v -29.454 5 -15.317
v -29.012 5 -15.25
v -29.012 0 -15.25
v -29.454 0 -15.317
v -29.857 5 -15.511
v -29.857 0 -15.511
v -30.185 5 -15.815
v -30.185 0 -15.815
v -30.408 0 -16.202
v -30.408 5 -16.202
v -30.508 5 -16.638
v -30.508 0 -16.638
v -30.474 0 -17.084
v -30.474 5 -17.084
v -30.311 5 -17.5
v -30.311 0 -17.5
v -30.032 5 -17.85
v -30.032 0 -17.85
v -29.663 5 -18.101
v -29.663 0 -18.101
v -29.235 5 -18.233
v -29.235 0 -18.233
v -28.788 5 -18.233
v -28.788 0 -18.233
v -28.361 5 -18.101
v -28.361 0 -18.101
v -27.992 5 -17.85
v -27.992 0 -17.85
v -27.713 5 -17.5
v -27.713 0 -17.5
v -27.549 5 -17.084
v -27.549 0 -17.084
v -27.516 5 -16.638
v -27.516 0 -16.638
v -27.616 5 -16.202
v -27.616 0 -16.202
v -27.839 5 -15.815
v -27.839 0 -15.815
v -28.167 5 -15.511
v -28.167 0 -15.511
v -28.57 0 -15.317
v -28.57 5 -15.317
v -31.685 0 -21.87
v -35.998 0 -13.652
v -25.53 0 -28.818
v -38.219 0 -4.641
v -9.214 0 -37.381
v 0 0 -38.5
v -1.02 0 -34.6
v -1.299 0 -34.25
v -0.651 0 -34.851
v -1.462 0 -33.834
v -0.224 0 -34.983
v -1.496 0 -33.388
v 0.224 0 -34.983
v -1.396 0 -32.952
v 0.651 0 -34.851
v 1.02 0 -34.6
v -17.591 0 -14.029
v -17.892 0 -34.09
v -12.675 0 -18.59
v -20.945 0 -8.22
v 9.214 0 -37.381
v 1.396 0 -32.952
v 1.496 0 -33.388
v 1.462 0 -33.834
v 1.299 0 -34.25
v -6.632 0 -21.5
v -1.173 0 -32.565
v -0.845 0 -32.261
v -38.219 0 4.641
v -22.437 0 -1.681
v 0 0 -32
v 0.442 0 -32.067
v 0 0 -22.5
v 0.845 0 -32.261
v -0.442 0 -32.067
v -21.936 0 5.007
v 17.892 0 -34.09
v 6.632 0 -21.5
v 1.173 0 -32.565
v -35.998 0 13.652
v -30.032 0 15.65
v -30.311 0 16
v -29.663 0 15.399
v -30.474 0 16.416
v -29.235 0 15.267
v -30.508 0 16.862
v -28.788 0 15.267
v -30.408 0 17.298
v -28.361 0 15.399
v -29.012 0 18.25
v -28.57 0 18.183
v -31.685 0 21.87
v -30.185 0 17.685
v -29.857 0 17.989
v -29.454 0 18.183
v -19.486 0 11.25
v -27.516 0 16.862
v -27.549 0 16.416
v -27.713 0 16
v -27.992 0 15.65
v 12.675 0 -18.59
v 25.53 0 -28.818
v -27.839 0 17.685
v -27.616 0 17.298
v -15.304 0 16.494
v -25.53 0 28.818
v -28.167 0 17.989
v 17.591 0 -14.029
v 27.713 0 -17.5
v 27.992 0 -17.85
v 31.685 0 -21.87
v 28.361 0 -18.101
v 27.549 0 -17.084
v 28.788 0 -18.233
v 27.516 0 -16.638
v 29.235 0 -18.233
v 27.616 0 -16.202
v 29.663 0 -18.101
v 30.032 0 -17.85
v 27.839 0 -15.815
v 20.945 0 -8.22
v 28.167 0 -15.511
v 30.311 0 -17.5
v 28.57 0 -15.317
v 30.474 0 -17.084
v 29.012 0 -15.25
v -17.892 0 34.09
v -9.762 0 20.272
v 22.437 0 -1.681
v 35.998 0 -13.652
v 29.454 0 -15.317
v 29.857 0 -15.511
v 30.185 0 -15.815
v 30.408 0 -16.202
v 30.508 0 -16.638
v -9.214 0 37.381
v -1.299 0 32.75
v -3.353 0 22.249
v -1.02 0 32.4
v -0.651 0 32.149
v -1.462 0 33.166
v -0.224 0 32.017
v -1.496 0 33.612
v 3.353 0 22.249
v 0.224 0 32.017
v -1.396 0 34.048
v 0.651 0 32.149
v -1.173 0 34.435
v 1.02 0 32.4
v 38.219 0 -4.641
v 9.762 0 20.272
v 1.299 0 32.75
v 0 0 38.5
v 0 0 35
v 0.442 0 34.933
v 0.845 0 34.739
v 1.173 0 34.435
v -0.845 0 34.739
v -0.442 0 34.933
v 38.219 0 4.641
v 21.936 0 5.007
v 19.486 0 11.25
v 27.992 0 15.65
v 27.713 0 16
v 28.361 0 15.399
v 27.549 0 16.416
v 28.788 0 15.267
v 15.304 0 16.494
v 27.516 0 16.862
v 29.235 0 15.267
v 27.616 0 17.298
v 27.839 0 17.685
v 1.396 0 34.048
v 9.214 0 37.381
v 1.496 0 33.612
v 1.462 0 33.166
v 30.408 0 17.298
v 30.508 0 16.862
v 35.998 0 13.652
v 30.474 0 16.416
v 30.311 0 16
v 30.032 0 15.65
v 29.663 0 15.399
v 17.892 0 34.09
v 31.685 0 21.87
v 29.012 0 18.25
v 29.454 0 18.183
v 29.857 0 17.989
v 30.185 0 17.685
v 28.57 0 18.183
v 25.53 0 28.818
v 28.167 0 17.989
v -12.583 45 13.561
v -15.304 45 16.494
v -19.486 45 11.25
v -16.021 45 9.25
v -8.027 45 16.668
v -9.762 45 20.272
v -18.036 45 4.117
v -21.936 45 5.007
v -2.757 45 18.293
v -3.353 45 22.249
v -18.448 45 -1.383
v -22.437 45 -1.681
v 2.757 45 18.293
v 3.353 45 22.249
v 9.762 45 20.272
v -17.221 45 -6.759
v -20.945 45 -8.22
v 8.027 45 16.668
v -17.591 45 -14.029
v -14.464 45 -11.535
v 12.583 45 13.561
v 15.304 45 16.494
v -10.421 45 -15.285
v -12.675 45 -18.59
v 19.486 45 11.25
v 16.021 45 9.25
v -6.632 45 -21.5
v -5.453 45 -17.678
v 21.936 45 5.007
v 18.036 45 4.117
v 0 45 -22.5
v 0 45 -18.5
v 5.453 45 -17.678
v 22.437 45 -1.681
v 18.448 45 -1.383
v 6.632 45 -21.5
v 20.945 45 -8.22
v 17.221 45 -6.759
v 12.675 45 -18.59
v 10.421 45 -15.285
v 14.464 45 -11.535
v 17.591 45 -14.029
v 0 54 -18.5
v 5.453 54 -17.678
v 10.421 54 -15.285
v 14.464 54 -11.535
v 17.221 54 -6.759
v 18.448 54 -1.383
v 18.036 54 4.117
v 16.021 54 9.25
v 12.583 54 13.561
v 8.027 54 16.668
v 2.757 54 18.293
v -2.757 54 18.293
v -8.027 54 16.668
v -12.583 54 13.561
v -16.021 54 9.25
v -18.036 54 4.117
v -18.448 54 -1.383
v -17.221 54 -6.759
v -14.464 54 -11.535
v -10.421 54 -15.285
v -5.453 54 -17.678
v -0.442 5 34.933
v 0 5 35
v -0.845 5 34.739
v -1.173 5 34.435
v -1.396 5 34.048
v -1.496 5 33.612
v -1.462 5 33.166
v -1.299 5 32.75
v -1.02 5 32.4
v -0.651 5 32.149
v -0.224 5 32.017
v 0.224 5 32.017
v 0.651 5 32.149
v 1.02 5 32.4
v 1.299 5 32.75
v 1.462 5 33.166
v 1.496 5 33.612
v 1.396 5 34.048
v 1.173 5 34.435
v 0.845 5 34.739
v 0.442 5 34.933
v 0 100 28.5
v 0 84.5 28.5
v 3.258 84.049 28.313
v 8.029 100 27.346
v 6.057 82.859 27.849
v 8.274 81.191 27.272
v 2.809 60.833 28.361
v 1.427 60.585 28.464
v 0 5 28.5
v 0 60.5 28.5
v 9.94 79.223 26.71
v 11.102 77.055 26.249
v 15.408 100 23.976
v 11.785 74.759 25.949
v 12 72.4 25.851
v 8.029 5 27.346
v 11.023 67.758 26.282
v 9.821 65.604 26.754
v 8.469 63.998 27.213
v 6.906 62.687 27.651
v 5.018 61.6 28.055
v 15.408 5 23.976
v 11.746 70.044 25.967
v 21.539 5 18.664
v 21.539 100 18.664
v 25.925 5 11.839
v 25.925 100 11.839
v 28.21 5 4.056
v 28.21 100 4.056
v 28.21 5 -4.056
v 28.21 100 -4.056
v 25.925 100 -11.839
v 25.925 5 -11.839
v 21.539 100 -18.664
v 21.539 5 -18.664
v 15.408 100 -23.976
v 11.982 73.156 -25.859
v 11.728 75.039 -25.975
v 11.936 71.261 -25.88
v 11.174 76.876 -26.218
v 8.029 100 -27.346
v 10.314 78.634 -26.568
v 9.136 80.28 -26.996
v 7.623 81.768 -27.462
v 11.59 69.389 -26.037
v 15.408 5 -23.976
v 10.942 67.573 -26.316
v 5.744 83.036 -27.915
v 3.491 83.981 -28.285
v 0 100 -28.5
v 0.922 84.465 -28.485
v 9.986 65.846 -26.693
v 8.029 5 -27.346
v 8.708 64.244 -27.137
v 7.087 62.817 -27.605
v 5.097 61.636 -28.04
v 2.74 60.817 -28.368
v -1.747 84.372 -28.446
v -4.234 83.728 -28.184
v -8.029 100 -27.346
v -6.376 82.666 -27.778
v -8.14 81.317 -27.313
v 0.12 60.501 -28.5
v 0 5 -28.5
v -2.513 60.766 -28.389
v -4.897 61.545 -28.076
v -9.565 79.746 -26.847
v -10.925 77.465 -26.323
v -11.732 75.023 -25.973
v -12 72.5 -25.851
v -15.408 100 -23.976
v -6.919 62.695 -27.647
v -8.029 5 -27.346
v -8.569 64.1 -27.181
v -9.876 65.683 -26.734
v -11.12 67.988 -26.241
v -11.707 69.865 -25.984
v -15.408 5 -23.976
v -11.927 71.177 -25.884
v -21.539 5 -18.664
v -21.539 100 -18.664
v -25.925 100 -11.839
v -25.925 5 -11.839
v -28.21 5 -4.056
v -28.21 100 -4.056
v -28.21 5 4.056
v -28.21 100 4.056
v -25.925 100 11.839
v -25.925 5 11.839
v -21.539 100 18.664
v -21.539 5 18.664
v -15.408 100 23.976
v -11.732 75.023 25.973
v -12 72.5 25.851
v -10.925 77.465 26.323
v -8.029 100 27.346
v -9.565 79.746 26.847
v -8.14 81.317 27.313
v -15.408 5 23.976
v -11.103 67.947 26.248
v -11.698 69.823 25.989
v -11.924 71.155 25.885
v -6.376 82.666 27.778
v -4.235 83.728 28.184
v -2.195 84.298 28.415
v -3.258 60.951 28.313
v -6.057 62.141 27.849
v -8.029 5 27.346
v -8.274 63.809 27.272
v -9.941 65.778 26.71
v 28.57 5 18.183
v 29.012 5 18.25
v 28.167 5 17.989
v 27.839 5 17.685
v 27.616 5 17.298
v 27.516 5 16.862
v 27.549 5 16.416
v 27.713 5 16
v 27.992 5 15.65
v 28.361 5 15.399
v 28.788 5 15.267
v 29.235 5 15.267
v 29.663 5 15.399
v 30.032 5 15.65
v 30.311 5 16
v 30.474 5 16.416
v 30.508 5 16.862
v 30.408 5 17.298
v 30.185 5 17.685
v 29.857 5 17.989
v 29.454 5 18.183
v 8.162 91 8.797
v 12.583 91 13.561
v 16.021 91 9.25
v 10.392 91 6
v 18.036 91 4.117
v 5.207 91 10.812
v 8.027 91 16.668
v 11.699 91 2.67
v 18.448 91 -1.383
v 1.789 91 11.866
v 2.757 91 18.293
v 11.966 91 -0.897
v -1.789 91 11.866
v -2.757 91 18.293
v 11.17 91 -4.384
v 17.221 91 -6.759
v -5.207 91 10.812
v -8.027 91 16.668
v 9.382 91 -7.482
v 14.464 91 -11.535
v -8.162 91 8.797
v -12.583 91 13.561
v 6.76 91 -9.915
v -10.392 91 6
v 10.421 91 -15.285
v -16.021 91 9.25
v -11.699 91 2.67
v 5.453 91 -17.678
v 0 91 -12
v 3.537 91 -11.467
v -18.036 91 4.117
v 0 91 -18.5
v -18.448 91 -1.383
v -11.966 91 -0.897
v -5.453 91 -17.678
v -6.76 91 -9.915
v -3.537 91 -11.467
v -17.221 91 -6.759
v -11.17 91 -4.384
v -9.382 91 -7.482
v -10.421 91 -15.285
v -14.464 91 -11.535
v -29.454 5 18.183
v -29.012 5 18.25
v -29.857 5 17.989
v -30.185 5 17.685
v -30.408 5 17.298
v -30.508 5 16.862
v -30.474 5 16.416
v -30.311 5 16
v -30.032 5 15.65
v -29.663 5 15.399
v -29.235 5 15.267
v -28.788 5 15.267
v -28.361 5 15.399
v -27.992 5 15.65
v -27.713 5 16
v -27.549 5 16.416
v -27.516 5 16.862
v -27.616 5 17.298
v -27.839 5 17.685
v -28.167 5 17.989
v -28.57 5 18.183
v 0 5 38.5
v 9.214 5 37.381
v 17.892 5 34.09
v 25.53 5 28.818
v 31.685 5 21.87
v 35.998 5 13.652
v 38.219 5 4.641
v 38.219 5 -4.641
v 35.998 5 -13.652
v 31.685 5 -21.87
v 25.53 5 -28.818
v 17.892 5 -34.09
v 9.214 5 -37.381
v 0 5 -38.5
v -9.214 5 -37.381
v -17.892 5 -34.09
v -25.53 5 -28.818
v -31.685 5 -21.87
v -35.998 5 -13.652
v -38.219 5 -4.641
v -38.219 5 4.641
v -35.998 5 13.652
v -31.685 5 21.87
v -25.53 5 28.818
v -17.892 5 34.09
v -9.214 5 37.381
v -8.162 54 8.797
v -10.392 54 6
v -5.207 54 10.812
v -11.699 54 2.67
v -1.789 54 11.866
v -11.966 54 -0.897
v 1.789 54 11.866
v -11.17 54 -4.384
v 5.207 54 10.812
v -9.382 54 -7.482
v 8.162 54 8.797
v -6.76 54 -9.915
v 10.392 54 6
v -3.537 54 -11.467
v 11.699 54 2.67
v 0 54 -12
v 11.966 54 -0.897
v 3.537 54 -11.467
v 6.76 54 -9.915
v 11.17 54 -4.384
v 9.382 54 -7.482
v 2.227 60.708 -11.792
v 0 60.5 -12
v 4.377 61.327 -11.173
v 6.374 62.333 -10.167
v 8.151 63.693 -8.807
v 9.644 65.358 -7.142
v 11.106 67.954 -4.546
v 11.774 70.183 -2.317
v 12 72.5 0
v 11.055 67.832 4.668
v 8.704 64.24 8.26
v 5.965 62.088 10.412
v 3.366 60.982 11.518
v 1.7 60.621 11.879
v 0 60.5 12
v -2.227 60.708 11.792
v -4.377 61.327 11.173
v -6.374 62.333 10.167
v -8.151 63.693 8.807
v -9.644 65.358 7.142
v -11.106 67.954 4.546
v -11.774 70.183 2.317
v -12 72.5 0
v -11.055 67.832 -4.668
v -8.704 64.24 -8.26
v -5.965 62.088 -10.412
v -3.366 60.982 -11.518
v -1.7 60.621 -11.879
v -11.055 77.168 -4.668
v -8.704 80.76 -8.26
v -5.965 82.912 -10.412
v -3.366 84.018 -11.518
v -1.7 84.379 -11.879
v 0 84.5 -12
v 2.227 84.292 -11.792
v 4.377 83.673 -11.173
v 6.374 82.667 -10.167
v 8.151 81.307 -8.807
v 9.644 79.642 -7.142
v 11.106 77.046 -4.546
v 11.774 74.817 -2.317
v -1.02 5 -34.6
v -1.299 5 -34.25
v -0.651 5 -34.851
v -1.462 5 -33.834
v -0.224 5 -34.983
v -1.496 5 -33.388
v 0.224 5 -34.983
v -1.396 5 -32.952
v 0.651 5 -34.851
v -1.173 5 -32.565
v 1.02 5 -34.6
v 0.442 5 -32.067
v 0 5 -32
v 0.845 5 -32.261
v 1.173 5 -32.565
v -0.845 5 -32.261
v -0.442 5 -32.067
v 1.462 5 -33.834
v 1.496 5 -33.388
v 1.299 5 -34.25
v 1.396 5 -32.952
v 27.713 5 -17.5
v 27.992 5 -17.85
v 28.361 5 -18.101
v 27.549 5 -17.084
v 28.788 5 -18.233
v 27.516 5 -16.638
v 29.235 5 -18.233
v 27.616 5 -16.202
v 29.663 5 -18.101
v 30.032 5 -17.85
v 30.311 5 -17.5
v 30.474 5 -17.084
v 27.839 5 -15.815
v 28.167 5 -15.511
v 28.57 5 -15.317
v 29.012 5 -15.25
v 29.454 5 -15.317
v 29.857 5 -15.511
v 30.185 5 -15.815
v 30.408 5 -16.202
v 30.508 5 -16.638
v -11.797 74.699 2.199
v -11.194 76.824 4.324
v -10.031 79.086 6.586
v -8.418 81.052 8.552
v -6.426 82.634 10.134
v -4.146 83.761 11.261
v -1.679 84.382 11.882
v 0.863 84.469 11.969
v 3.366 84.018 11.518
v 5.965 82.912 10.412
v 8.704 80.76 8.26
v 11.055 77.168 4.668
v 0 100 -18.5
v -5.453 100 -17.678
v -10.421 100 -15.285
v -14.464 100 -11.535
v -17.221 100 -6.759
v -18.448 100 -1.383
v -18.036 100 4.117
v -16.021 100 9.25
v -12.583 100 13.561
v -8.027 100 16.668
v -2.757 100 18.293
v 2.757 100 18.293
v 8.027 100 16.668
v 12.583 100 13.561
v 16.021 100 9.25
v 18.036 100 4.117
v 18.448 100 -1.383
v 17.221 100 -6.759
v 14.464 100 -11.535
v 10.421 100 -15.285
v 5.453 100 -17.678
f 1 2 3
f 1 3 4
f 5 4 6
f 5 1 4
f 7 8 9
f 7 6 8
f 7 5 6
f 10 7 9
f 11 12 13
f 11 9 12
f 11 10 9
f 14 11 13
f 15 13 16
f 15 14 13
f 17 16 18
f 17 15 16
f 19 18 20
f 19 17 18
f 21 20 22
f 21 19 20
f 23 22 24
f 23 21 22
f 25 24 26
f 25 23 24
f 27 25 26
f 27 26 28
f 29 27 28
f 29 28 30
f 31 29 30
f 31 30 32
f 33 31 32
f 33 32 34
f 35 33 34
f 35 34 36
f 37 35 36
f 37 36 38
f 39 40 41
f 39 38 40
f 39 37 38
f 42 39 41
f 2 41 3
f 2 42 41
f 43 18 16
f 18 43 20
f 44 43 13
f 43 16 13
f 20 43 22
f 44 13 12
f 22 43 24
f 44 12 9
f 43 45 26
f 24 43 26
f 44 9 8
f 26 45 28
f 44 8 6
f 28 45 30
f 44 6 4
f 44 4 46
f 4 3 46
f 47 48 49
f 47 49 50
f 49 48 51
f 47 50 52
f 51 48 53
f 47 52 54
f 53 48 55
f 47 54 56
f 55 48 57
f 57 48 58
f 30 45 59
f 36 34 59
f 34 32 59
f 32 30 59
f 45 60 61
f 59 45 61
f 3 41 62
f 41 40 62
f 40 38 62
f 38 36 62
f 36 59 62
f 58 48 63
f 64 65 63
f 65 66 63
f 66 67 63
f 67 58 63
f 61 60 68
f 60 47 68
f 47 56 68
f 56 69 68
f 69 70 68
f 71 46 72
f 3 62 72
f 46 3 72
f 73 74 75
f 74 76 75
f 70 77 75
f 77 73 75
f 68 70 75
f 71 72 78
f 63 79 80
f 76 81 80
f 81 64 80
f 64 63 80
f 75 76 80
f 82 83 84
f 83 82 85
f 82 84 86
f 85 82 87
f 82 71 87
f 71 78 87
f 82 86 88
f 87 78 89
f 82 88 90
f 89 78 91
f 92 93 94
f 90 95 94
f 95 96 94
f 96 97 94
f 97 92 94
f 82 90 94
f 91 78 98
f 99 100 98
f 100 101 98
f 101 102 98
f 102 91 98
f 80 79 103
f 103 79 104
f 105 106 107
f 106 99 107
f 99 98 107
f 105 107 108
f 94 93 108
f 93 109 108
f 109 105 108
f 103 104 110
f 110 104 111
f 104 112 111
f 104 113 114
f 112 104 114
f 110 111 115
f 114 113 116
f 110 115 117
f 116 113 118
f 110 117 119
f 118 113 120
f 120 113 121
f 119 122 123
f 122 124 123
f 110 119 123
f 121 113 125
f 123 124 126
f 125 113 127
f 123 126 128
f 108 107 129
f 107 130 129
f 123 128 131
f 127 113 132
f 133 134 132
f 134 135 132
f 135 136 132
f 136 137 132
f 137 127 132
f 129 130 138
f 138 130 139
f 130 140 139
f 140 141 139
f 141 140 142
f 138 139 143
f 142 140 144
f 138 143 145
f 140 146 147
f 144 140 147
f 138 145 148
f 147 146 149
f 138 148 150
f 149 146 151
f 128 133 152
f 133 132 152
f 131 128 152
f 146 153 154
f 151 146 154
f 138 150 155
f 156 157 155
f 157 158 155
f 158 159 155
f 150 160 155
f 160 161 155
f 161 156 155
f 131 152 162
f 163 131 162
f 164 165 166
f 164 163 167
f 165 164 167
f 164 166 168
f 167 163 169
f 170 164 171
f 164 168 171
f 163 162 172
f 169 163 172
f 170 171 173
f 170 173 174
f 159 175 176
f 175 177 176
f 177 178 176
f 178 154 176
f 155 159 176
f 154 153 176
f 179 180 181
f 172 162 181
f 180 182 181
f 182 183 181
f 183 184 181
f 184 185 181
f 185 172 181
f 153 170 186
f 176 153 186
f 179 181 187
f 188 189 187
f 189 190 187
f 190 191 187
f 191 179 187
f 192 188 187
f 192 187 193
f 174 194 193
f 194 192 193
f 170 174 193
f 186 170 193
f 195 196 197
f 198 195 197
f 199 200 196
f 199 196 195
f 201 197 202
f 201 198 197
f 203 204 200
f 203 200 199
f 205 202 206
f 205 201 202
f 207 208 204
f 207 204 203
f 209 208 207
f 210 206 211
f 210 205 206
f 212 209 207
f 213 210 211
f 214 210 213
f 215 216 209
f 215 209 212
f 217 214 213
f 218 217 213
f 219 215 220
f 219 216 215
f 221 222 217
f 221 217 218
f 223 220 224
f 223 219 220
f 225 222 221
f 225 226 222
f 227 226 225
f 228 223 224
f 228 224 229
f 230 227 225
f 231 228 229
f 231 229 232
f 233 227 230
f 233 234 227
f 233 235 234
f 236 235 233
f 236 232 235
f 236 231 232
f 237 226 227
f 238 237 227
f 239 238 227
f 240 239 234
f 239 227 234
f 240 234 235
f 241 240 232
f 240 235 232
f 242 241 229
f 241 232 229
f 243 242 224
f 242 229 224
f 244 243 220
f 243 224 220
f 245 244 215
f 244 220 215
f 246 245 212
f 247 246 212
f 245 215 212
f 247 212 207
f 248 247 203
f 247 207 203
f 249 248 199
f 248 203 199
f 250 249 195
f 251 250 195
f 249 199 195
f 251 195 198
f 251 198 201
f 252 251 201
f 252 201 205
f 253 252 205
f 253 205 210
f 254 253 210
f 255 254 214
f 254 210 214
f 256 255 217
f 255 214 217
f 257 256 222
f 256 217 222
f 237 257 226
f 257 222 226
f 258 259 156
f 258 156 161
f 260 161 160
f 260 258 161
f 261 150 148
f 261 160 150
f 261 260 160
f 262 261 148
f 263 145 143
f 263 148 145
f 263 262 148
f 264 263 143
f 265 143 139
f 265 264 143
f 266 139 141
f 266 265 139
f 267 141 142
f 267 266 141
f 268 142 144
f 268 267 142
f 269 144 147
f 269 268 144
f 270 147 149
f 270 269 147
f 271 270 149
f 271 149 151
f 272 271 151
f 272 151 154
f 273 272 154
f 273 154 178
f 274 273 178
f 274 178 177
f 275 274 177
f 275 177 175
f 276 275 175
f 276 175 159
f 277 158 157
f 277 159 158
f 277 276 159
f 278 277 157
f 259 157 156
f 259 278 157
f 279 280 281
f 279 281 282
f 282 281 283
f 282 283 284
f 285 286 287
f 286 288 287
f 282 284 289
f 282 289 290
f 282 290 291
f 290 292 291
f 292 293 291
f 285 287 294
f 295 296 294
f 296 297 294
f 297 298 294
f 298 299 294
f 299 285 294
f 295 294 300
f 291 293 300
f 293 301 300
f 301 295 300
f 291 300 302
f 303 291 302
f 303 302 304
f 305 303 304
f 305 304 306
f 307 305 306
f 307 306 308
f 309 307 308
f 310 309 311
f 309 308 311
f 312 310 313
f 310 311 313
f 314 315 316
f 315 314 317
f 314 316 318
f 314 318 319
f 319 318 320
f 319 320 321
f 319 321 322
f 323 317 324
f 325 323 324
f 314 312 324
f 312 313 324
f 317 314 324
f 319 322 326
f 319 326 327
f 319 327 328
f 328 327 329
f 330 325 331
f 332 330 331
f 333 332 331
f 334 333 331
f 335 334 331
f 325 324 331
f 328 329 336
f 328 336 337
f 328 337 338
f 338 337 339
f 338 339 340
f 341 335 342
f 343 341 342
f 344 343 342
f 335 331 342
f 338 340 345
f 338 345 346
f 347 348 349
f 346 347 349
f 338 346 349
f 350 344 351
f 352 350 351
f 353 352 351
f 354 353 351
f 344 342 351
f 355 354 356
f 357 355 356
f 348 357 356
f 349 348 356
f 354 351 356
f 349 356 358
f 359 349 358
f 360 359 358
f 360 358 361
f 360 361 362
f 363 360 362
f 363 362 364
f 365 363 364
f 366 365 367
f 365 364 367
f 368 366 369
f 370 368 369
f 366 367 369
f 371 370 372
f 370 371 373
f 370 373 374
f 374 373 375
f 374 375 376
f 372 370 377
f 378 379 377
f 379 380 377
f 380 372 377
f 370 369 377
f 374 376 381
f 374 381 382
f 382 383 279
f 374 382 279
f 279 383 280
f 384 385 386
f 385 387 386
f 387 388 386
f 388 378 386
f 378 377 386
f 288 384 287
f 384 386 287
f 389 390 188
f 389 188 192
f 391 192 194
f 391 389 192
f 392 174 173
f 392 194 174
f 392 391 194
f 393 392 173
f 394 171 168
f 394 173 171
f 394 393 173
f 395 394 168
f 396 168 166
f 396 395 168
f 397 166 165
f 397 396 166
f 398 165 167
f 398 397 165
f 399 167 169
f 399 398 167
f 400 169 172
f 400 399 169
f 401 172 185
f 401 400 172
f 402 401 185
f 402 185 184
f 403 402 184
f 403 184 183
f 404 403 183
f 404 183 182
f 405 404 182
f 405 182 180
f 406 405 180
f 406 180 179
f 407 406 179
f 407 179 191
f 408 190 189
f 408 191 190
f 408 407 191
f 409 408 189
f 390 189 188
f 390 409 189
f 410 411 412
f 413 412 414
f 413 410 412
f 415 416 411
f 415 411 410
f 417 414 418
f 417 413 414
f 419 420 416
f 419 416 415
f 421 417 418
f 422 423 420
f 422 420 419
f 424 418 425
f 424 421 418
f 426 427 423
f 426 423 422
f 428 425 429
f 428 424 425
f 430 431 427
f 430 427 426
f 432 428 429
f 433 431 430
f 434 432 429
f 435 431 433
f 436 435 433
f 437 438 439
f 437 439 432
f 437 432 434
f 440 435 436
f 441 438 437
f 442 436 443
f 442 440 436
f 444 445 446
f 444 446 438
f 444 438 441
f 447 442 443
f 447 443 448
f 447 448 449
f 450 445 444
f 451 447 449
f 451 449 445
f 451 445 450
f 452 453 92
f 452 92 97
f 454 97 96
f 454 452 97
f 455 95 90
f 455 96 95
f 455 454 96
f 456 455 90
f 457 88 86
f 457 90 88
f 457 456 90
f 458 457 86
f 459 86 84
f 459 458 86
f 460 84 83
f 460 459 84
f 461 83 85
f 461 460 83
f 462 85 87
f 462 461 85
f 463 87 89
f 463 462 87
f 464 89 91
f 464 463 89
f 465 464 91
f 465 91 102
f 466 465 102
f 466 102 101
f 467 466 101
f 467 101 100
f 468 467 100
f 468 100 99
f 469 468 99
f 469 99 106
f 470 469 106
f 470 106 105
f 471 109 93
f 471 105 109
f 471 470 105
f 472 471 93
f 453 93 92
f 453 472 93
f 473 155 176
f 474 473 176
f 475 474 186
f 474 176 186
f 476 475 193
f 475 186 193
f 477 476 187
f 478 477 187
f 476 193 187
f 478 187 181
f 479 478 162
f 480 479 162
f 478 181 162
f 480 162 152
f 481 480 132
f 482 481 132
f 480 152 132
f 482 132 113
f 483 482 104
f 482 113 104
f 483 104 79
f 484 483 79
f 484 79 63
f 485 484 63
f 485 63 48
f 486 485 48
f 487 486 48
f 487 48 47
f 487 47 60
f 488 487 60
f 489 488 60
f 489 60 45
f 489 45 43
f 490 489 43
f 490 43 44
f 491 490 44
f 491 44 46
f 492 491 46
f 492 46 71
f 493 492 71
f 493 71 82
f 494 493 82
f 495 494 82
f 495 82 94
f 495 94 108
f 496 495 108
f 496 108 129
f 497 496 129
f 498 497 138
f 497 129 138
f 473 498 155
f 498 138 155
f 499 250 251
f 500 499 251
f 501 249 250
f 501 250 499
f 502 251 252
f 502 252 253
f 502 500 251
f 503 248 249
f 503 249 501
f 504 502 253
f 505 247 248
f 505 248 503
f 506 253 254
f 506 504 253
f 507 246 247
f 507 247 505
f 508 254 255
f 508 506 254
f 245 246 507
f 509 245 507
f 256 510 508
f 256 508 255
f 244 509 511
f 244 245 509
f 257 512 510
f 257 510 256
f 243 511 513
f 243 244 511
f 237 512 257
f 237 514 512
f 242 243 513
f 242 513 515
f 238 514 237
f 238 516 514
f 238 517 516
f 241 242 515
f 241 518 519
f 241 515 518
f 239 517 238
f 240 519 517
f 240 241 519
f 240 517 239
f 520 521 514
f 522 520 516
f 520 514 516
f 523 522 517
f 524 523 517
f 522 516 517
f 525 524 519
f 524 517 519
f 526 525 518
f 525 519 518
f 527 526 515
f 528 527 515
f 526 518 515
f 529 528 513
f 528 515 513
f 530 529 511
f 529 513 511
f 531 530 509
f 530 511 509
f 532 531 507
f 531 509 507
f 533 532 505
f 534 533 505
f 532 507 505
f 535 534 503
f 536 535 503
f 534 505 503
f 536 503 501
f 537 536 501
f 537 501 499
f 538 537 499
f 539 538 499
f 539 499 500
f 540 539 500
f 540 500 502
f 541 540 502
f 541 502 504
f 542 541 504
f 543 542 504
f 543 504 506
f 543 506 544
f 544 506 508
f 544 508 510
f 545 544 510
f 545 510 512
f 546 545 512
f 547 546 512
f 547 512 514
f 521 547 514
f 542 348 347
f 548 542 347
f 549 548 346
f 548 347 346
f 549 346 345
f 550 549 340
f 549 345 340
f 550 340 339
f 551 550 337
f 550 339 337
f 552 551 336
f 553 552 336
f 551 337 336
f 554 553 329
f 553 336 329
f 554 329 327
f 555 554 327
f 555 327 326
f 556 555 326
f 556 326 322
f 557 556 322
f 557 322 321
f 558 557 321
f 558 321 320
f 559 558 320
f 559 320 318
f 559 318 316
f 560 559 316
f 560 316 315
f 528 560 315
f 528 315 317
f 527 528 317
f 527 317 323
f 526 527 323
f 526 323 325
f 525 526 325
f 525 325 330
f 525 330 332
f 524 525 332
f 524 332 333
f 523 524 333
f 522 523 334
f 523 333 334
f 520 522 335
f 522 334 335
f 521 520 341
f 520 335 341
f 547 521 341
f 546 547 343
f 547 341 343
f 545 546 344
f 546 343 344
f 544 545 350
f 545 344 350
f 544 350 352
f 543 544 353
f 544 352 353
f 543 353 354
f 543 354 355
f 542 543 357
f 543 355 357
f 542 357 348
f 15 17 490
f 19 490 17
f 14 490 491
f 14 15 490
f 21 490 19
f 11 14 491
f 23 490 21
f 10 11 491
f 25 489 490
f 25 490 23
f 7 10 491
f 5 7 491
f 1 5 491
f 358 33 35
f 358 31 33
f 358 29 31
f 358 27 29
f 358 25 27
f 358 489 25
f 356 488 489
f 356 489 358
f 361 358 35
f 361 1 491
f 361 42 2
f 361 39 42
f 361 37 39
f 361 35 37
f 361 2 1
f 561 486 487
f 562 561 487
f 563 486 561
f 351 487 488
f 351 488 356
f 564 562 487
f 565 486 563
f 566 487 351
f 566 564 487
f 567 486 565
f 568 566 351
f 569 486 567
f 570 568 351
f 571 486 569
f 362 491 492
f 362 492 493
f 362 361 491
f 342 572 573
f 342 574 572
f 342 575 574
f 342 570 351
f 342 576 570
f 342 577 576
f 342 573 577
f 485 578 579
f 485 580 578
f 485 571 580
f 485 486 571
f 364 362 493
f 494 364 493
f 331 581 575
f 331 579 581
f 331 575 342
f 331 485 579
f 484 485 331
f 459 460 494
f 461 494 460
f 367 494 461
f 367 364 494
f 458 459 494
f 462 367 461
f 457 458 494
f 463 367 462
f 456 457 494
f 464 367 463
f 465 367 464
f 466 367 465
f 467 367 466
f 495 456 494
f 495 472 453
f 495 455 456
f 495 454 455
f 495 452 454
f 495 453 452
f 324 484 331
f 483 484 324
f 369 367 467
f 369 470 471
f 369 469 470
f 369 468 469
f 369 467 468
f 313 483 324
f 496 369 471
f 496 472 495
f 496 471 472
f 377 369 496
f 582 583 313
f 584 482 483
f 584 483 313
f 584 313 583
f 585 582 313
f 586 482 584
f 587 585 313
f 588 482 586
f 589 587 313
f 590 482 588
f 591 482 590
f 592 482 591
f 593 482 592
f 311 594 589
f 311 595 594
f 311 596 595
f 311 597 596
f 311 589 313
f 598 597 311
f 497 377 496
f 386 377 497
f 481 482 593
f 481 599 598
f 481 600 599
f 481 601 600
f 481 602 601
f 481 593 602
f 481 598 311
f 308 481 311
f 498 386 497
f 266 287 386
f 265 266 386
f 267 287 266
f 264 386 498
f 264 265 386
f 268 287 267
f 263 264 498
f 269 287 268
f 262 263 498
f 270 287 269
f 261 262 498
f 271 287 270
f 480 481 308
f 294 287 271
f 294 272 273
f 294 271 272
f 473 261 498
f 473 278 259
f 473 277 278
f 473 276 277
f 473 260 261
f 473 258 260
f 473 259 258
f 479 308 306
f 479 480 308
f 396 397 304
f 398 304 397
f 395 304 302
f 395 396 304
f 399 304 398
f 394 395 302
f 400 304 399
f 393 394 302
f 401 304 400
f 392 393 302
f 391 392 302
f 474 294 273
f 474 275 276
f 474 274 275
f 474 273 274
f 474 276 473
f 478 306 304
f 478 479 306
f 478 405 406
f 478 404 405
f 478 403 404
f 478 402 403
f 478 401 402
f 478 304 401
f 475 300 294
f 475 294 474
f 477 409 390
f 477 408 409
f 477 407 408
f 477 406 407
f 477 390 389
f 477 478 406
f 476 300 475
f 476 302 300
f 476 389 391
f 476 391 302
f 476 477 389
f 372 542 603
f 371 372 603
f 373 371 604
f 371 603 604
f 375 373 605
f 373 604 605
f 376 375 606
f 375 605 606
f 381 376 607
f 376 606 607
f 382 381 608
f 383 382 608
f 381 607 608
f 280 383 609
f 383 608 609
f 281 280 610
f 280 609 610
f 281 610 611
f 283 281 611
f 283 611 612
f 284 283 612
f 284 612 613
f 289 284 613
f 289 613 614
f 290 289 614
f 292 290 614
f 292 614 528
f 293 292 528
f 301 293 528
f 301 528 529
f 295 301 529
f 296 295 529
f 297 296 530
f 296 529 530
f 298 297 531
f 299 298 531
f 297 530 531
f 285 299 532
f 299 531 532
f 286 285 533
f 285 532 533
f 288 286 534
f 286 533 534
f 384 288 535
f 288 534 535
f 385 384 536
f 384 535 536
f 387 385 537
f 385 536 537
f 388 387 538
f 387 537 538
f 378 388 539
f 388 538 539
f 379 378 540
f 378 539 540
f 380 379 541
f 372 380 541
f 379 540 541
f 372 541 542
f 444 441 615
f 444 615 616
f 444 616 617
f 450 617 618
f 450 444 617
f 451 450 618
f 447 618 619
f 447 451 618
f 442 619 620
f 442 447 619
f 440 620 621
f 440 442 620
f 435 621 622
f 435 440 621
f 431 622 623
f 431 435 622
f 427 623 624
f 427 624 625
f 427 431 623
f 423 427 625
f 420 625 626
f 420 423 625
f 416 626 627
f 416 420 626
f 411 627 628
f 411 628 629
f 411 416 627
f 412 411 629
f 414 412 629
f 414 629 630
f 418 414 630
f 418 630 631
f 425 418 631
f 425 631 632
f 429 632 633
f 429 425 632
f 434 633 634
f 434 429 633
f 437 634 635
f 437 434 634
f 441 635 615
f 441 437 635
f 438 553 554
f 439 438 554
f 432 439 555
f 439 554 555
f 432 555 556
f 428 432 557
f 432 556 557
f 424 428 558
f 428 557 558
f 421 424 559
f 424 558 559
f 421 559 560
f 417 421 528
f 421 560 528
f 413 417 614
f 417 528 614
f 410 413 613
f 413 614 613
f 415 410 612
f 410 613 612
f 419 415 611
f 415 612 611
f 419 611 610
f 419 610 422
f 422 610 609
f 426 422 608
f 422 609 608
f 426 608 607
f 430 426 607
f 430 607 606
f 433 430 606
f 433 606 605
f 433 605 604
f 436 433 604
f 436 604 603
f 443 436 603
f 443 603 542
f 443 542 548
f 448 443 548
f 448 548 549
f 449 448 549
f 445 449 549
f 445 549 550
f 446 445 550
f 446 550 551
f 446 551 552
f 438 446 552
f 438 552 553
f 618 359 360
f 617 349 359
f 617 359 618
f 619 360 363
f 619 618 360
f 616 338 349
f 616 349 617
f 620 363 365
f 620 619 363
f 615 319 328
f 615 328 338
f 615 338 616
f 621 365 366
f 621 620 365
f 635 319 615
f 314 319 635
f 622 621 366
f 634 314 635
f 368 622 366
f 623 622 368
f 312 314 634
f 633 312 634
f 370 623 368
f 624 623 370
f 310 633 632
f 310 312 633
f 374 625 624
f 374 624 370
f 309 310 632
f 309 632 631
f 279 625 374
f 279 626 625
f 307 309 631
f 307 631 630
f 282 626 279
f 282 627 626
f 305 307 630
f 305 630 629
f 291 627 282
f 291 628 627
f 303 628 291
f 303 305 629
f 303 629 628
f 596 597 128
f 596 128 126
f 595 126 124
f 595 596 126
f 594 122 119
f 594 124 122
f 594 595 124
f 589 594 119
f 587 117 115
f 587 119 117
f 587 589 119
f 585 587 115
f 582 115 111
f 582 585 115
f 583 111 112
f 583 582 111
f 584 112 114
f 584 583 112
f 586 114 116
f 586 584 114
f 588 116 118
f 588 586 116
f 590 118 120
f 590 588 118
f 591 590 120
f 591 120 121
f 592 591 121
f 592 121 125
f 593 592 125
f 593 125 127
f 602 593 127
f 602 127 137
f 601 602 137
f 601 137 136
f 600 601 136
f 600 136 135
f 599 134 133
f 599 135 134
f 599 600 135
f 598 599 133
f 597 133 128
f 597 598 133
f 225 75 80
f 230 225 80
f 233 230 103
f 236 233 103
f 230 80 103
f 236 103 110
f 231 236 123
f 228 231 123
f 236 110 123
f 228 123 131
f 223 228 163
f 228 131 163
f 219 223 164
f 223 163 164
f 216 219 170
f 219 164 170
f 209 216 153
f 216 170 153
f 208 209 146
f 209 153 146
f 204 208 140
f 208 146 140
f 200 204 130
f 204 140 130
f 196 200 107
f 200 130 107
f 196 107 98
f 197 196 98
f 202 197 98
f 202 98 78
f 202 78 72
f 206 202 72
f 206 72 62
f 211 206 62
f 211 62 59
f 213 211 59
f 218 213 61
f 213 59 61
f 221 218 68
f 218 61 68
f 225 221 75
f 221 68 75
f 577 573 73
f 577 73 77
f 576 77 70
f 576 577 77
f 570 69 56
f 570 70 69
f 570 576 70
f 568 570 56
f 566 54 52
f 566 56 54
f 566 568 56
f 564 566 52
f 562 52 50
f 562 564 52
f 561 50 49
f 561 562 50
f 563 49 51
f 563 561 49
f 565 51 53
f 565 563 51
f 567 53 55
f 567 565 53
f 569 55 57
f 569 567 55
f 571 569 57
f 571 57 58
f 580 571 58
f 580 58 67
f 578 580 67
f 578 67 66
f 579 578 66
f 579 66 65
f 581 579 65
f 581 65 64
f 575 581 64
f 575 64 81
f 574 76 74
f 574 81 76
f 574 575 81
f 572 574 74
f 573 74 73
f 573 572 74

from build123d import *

# Parameters (mm, degrees)
ESQUISSE1_R             = 38.5
BOSS_EXTRU_1_DEPTH      = 100
ENL_V_START             = -95
ESQUISSE2_R             = 38.5
ESQUISSE2_R_2           = 28.5
ENL_V_MAT_EXTRU_1_DEPTH = 95
ESQUISSE4_R             = 22.5
ENL_V_MAT_EXTRU_2_DEPTH = 45
ESQUISSE5_R             = 18.5
ENL_V_MAT_EXTRU_3_DEPTH = 9
ESQUISSE6_R             = 12
ENL_V_MAT_EXTRU_4_DEPTH = 77.684418235
D_GAGEMENT_M222_D       = 24
ESQUISSE14_R            = 1.5
ENL_V_MAT_EXTRU_8_DEPTH = 77.684418235
ENL_V_START_2           = -9
ESQUISSE16_R            = 18.5
ENL_V_MAT_EXTRU_9_DEPTH = 9


with BuildPart() as part:
    # Esquisse1 → Boss.-Extru.1 (new body)
    with BuildSketch(Plane(origin=(0, 0, 0), x_dir=(1, 0, 0), z_dir=(0, 1, 0))):
        with Locations(Location((0, 0, 0), (0, 0, 270))):
            Circle(ESQUISSE1_R)
    extrude(amount=BOSS_EXTRU_1_DEPTH)

    # Esquisse2 → Enlèv. mat.-Extru.1 (cut)
    with BuildSketch(Plane(origin=(0, 100, 0), x_dir=(1, 0, 0), z_dir=(0, 1, 0)).offset(ENL_V_START)):
        with Locations(Location((0, 0, 0), (0, 0, 270))):
            Circle(ESQUISSE2_R)
        with Locations(Location((0, 0, 0), (0, 0, 270))):
            Circle(ESQUISSE2_R_2, mode=Mode.SUBTRACT)
    extrude(amount=ENL_V_MAT_EXTRU_1_DEPTH, mode=Mode.SUBTRACT)

    # Esquisse4 → Enlèv. mat.-Extru.2 (cut)
    with BuildSketch(Plane(origin=(0, 0, 0), x_dir=(-1, 0, 0), z_dir=(0, -1, 0))):
        with Locations(Location((0, 0, 0), (0, 0, 90))):
            Circle(ESQUISSE4_R)
    extrude(amount=-ENL_V_MAT_EXTRU_2_DEPTH, mode=Mode.SUBTRACT)

    # Esquisse5 → Enlèv. mat.-Extru.3 (cut)
    with BuildSketch(Plane(origin=(0, 45, 0), x_dir=(-1, 0, 0), z_dir=(0, -1, 0))):
        with Locations(Location((0, 0, 0), (0, 0, 90))):
            Circle(ESQUISSE5_R)
    extrude(amount=-ENL_V_MAT_EXTRU_3_DEPTH, mode=Mode.SUBTRACT)

    # Esquisse6 → Enlèv. mat.-Extru.4 (cut, through all)
    with BuildSketch(Plane(origin=(0, 54, 0), x_dir=(-1, 0, 0), z_dir=(0, -1, 0))):
        with Locations(Location((0, 0, 0), (0, 0, 90))):
            Circle(ESQUISSE6_R)
    extrude(amount=-ENL_V_MAT_EXTRU_4_DEPTH, mode=Mode.SUBTRACT)

    # Dégagement M222 (through all)
    with Locations(Plane(origin=(0, 72.5, 28.5), x_dir=(1, 0, 0), z_dir=(0, 0, 1))):
        with Locations((0, 0)):
            Hole(D_GAGEMENT_M222_D / 2)

    # Esquisse14 → Enlèv. mat.-Extru.8 (cut, through all)
    with BuildSketch(Plane(origin=(0, 54, 0), x_dir=(-1, 0, 0), z_dir=(0, -1, 0))):
        with Locations(Location((0, -33.5, 0), (0, 0, 270))):
            Circle(ESQUISSE14_R)
        with Locations(Location((-29.011851027, -16.75, 0), (0, 0, 270))):
            Circle(ESQUISSE14_R)
        with Locations(Location((-29.011851027, 16.75, 0), (0, 0, 270))):
            Circle(ESQUISSE14_R)
        with Locations(Location((0, 33.5, 0), (0, 0, 270))):
            Circle(ESQUISSE14_R)
        with Locations(Location((29.011851027, 16.75, 0), (0, 0, 270))):
            Circle(ESQUISSE14_R)
        with Locations(Location((29.011851027, -16.75, 0), (0, 0, 270))):
            Circle(ESQUISSE14_R)
    extrude(amount=ENL_V_MAT_EXTRU_8_DEPTH, mode=Mode.SUBTRACT)

    # Esquisse16 → Enlèv. mat.-Extru.9 (cut)
    with BuildSketch(Plane(origin=(0, 100, 0), x_dir=(1, 0, 0), z_dir=(0, 1, 0)).offset(ENL_V_START_2)):
        with Locations(Location((0, 0, 0), (0, 0, 90))):
            Circle(ESQUISSE16_R)
    extrude(amount=ENL_V_MAT_EXTRU_9_DEPTH, mode=Mode.SUBTRACT)


solid = part.part
